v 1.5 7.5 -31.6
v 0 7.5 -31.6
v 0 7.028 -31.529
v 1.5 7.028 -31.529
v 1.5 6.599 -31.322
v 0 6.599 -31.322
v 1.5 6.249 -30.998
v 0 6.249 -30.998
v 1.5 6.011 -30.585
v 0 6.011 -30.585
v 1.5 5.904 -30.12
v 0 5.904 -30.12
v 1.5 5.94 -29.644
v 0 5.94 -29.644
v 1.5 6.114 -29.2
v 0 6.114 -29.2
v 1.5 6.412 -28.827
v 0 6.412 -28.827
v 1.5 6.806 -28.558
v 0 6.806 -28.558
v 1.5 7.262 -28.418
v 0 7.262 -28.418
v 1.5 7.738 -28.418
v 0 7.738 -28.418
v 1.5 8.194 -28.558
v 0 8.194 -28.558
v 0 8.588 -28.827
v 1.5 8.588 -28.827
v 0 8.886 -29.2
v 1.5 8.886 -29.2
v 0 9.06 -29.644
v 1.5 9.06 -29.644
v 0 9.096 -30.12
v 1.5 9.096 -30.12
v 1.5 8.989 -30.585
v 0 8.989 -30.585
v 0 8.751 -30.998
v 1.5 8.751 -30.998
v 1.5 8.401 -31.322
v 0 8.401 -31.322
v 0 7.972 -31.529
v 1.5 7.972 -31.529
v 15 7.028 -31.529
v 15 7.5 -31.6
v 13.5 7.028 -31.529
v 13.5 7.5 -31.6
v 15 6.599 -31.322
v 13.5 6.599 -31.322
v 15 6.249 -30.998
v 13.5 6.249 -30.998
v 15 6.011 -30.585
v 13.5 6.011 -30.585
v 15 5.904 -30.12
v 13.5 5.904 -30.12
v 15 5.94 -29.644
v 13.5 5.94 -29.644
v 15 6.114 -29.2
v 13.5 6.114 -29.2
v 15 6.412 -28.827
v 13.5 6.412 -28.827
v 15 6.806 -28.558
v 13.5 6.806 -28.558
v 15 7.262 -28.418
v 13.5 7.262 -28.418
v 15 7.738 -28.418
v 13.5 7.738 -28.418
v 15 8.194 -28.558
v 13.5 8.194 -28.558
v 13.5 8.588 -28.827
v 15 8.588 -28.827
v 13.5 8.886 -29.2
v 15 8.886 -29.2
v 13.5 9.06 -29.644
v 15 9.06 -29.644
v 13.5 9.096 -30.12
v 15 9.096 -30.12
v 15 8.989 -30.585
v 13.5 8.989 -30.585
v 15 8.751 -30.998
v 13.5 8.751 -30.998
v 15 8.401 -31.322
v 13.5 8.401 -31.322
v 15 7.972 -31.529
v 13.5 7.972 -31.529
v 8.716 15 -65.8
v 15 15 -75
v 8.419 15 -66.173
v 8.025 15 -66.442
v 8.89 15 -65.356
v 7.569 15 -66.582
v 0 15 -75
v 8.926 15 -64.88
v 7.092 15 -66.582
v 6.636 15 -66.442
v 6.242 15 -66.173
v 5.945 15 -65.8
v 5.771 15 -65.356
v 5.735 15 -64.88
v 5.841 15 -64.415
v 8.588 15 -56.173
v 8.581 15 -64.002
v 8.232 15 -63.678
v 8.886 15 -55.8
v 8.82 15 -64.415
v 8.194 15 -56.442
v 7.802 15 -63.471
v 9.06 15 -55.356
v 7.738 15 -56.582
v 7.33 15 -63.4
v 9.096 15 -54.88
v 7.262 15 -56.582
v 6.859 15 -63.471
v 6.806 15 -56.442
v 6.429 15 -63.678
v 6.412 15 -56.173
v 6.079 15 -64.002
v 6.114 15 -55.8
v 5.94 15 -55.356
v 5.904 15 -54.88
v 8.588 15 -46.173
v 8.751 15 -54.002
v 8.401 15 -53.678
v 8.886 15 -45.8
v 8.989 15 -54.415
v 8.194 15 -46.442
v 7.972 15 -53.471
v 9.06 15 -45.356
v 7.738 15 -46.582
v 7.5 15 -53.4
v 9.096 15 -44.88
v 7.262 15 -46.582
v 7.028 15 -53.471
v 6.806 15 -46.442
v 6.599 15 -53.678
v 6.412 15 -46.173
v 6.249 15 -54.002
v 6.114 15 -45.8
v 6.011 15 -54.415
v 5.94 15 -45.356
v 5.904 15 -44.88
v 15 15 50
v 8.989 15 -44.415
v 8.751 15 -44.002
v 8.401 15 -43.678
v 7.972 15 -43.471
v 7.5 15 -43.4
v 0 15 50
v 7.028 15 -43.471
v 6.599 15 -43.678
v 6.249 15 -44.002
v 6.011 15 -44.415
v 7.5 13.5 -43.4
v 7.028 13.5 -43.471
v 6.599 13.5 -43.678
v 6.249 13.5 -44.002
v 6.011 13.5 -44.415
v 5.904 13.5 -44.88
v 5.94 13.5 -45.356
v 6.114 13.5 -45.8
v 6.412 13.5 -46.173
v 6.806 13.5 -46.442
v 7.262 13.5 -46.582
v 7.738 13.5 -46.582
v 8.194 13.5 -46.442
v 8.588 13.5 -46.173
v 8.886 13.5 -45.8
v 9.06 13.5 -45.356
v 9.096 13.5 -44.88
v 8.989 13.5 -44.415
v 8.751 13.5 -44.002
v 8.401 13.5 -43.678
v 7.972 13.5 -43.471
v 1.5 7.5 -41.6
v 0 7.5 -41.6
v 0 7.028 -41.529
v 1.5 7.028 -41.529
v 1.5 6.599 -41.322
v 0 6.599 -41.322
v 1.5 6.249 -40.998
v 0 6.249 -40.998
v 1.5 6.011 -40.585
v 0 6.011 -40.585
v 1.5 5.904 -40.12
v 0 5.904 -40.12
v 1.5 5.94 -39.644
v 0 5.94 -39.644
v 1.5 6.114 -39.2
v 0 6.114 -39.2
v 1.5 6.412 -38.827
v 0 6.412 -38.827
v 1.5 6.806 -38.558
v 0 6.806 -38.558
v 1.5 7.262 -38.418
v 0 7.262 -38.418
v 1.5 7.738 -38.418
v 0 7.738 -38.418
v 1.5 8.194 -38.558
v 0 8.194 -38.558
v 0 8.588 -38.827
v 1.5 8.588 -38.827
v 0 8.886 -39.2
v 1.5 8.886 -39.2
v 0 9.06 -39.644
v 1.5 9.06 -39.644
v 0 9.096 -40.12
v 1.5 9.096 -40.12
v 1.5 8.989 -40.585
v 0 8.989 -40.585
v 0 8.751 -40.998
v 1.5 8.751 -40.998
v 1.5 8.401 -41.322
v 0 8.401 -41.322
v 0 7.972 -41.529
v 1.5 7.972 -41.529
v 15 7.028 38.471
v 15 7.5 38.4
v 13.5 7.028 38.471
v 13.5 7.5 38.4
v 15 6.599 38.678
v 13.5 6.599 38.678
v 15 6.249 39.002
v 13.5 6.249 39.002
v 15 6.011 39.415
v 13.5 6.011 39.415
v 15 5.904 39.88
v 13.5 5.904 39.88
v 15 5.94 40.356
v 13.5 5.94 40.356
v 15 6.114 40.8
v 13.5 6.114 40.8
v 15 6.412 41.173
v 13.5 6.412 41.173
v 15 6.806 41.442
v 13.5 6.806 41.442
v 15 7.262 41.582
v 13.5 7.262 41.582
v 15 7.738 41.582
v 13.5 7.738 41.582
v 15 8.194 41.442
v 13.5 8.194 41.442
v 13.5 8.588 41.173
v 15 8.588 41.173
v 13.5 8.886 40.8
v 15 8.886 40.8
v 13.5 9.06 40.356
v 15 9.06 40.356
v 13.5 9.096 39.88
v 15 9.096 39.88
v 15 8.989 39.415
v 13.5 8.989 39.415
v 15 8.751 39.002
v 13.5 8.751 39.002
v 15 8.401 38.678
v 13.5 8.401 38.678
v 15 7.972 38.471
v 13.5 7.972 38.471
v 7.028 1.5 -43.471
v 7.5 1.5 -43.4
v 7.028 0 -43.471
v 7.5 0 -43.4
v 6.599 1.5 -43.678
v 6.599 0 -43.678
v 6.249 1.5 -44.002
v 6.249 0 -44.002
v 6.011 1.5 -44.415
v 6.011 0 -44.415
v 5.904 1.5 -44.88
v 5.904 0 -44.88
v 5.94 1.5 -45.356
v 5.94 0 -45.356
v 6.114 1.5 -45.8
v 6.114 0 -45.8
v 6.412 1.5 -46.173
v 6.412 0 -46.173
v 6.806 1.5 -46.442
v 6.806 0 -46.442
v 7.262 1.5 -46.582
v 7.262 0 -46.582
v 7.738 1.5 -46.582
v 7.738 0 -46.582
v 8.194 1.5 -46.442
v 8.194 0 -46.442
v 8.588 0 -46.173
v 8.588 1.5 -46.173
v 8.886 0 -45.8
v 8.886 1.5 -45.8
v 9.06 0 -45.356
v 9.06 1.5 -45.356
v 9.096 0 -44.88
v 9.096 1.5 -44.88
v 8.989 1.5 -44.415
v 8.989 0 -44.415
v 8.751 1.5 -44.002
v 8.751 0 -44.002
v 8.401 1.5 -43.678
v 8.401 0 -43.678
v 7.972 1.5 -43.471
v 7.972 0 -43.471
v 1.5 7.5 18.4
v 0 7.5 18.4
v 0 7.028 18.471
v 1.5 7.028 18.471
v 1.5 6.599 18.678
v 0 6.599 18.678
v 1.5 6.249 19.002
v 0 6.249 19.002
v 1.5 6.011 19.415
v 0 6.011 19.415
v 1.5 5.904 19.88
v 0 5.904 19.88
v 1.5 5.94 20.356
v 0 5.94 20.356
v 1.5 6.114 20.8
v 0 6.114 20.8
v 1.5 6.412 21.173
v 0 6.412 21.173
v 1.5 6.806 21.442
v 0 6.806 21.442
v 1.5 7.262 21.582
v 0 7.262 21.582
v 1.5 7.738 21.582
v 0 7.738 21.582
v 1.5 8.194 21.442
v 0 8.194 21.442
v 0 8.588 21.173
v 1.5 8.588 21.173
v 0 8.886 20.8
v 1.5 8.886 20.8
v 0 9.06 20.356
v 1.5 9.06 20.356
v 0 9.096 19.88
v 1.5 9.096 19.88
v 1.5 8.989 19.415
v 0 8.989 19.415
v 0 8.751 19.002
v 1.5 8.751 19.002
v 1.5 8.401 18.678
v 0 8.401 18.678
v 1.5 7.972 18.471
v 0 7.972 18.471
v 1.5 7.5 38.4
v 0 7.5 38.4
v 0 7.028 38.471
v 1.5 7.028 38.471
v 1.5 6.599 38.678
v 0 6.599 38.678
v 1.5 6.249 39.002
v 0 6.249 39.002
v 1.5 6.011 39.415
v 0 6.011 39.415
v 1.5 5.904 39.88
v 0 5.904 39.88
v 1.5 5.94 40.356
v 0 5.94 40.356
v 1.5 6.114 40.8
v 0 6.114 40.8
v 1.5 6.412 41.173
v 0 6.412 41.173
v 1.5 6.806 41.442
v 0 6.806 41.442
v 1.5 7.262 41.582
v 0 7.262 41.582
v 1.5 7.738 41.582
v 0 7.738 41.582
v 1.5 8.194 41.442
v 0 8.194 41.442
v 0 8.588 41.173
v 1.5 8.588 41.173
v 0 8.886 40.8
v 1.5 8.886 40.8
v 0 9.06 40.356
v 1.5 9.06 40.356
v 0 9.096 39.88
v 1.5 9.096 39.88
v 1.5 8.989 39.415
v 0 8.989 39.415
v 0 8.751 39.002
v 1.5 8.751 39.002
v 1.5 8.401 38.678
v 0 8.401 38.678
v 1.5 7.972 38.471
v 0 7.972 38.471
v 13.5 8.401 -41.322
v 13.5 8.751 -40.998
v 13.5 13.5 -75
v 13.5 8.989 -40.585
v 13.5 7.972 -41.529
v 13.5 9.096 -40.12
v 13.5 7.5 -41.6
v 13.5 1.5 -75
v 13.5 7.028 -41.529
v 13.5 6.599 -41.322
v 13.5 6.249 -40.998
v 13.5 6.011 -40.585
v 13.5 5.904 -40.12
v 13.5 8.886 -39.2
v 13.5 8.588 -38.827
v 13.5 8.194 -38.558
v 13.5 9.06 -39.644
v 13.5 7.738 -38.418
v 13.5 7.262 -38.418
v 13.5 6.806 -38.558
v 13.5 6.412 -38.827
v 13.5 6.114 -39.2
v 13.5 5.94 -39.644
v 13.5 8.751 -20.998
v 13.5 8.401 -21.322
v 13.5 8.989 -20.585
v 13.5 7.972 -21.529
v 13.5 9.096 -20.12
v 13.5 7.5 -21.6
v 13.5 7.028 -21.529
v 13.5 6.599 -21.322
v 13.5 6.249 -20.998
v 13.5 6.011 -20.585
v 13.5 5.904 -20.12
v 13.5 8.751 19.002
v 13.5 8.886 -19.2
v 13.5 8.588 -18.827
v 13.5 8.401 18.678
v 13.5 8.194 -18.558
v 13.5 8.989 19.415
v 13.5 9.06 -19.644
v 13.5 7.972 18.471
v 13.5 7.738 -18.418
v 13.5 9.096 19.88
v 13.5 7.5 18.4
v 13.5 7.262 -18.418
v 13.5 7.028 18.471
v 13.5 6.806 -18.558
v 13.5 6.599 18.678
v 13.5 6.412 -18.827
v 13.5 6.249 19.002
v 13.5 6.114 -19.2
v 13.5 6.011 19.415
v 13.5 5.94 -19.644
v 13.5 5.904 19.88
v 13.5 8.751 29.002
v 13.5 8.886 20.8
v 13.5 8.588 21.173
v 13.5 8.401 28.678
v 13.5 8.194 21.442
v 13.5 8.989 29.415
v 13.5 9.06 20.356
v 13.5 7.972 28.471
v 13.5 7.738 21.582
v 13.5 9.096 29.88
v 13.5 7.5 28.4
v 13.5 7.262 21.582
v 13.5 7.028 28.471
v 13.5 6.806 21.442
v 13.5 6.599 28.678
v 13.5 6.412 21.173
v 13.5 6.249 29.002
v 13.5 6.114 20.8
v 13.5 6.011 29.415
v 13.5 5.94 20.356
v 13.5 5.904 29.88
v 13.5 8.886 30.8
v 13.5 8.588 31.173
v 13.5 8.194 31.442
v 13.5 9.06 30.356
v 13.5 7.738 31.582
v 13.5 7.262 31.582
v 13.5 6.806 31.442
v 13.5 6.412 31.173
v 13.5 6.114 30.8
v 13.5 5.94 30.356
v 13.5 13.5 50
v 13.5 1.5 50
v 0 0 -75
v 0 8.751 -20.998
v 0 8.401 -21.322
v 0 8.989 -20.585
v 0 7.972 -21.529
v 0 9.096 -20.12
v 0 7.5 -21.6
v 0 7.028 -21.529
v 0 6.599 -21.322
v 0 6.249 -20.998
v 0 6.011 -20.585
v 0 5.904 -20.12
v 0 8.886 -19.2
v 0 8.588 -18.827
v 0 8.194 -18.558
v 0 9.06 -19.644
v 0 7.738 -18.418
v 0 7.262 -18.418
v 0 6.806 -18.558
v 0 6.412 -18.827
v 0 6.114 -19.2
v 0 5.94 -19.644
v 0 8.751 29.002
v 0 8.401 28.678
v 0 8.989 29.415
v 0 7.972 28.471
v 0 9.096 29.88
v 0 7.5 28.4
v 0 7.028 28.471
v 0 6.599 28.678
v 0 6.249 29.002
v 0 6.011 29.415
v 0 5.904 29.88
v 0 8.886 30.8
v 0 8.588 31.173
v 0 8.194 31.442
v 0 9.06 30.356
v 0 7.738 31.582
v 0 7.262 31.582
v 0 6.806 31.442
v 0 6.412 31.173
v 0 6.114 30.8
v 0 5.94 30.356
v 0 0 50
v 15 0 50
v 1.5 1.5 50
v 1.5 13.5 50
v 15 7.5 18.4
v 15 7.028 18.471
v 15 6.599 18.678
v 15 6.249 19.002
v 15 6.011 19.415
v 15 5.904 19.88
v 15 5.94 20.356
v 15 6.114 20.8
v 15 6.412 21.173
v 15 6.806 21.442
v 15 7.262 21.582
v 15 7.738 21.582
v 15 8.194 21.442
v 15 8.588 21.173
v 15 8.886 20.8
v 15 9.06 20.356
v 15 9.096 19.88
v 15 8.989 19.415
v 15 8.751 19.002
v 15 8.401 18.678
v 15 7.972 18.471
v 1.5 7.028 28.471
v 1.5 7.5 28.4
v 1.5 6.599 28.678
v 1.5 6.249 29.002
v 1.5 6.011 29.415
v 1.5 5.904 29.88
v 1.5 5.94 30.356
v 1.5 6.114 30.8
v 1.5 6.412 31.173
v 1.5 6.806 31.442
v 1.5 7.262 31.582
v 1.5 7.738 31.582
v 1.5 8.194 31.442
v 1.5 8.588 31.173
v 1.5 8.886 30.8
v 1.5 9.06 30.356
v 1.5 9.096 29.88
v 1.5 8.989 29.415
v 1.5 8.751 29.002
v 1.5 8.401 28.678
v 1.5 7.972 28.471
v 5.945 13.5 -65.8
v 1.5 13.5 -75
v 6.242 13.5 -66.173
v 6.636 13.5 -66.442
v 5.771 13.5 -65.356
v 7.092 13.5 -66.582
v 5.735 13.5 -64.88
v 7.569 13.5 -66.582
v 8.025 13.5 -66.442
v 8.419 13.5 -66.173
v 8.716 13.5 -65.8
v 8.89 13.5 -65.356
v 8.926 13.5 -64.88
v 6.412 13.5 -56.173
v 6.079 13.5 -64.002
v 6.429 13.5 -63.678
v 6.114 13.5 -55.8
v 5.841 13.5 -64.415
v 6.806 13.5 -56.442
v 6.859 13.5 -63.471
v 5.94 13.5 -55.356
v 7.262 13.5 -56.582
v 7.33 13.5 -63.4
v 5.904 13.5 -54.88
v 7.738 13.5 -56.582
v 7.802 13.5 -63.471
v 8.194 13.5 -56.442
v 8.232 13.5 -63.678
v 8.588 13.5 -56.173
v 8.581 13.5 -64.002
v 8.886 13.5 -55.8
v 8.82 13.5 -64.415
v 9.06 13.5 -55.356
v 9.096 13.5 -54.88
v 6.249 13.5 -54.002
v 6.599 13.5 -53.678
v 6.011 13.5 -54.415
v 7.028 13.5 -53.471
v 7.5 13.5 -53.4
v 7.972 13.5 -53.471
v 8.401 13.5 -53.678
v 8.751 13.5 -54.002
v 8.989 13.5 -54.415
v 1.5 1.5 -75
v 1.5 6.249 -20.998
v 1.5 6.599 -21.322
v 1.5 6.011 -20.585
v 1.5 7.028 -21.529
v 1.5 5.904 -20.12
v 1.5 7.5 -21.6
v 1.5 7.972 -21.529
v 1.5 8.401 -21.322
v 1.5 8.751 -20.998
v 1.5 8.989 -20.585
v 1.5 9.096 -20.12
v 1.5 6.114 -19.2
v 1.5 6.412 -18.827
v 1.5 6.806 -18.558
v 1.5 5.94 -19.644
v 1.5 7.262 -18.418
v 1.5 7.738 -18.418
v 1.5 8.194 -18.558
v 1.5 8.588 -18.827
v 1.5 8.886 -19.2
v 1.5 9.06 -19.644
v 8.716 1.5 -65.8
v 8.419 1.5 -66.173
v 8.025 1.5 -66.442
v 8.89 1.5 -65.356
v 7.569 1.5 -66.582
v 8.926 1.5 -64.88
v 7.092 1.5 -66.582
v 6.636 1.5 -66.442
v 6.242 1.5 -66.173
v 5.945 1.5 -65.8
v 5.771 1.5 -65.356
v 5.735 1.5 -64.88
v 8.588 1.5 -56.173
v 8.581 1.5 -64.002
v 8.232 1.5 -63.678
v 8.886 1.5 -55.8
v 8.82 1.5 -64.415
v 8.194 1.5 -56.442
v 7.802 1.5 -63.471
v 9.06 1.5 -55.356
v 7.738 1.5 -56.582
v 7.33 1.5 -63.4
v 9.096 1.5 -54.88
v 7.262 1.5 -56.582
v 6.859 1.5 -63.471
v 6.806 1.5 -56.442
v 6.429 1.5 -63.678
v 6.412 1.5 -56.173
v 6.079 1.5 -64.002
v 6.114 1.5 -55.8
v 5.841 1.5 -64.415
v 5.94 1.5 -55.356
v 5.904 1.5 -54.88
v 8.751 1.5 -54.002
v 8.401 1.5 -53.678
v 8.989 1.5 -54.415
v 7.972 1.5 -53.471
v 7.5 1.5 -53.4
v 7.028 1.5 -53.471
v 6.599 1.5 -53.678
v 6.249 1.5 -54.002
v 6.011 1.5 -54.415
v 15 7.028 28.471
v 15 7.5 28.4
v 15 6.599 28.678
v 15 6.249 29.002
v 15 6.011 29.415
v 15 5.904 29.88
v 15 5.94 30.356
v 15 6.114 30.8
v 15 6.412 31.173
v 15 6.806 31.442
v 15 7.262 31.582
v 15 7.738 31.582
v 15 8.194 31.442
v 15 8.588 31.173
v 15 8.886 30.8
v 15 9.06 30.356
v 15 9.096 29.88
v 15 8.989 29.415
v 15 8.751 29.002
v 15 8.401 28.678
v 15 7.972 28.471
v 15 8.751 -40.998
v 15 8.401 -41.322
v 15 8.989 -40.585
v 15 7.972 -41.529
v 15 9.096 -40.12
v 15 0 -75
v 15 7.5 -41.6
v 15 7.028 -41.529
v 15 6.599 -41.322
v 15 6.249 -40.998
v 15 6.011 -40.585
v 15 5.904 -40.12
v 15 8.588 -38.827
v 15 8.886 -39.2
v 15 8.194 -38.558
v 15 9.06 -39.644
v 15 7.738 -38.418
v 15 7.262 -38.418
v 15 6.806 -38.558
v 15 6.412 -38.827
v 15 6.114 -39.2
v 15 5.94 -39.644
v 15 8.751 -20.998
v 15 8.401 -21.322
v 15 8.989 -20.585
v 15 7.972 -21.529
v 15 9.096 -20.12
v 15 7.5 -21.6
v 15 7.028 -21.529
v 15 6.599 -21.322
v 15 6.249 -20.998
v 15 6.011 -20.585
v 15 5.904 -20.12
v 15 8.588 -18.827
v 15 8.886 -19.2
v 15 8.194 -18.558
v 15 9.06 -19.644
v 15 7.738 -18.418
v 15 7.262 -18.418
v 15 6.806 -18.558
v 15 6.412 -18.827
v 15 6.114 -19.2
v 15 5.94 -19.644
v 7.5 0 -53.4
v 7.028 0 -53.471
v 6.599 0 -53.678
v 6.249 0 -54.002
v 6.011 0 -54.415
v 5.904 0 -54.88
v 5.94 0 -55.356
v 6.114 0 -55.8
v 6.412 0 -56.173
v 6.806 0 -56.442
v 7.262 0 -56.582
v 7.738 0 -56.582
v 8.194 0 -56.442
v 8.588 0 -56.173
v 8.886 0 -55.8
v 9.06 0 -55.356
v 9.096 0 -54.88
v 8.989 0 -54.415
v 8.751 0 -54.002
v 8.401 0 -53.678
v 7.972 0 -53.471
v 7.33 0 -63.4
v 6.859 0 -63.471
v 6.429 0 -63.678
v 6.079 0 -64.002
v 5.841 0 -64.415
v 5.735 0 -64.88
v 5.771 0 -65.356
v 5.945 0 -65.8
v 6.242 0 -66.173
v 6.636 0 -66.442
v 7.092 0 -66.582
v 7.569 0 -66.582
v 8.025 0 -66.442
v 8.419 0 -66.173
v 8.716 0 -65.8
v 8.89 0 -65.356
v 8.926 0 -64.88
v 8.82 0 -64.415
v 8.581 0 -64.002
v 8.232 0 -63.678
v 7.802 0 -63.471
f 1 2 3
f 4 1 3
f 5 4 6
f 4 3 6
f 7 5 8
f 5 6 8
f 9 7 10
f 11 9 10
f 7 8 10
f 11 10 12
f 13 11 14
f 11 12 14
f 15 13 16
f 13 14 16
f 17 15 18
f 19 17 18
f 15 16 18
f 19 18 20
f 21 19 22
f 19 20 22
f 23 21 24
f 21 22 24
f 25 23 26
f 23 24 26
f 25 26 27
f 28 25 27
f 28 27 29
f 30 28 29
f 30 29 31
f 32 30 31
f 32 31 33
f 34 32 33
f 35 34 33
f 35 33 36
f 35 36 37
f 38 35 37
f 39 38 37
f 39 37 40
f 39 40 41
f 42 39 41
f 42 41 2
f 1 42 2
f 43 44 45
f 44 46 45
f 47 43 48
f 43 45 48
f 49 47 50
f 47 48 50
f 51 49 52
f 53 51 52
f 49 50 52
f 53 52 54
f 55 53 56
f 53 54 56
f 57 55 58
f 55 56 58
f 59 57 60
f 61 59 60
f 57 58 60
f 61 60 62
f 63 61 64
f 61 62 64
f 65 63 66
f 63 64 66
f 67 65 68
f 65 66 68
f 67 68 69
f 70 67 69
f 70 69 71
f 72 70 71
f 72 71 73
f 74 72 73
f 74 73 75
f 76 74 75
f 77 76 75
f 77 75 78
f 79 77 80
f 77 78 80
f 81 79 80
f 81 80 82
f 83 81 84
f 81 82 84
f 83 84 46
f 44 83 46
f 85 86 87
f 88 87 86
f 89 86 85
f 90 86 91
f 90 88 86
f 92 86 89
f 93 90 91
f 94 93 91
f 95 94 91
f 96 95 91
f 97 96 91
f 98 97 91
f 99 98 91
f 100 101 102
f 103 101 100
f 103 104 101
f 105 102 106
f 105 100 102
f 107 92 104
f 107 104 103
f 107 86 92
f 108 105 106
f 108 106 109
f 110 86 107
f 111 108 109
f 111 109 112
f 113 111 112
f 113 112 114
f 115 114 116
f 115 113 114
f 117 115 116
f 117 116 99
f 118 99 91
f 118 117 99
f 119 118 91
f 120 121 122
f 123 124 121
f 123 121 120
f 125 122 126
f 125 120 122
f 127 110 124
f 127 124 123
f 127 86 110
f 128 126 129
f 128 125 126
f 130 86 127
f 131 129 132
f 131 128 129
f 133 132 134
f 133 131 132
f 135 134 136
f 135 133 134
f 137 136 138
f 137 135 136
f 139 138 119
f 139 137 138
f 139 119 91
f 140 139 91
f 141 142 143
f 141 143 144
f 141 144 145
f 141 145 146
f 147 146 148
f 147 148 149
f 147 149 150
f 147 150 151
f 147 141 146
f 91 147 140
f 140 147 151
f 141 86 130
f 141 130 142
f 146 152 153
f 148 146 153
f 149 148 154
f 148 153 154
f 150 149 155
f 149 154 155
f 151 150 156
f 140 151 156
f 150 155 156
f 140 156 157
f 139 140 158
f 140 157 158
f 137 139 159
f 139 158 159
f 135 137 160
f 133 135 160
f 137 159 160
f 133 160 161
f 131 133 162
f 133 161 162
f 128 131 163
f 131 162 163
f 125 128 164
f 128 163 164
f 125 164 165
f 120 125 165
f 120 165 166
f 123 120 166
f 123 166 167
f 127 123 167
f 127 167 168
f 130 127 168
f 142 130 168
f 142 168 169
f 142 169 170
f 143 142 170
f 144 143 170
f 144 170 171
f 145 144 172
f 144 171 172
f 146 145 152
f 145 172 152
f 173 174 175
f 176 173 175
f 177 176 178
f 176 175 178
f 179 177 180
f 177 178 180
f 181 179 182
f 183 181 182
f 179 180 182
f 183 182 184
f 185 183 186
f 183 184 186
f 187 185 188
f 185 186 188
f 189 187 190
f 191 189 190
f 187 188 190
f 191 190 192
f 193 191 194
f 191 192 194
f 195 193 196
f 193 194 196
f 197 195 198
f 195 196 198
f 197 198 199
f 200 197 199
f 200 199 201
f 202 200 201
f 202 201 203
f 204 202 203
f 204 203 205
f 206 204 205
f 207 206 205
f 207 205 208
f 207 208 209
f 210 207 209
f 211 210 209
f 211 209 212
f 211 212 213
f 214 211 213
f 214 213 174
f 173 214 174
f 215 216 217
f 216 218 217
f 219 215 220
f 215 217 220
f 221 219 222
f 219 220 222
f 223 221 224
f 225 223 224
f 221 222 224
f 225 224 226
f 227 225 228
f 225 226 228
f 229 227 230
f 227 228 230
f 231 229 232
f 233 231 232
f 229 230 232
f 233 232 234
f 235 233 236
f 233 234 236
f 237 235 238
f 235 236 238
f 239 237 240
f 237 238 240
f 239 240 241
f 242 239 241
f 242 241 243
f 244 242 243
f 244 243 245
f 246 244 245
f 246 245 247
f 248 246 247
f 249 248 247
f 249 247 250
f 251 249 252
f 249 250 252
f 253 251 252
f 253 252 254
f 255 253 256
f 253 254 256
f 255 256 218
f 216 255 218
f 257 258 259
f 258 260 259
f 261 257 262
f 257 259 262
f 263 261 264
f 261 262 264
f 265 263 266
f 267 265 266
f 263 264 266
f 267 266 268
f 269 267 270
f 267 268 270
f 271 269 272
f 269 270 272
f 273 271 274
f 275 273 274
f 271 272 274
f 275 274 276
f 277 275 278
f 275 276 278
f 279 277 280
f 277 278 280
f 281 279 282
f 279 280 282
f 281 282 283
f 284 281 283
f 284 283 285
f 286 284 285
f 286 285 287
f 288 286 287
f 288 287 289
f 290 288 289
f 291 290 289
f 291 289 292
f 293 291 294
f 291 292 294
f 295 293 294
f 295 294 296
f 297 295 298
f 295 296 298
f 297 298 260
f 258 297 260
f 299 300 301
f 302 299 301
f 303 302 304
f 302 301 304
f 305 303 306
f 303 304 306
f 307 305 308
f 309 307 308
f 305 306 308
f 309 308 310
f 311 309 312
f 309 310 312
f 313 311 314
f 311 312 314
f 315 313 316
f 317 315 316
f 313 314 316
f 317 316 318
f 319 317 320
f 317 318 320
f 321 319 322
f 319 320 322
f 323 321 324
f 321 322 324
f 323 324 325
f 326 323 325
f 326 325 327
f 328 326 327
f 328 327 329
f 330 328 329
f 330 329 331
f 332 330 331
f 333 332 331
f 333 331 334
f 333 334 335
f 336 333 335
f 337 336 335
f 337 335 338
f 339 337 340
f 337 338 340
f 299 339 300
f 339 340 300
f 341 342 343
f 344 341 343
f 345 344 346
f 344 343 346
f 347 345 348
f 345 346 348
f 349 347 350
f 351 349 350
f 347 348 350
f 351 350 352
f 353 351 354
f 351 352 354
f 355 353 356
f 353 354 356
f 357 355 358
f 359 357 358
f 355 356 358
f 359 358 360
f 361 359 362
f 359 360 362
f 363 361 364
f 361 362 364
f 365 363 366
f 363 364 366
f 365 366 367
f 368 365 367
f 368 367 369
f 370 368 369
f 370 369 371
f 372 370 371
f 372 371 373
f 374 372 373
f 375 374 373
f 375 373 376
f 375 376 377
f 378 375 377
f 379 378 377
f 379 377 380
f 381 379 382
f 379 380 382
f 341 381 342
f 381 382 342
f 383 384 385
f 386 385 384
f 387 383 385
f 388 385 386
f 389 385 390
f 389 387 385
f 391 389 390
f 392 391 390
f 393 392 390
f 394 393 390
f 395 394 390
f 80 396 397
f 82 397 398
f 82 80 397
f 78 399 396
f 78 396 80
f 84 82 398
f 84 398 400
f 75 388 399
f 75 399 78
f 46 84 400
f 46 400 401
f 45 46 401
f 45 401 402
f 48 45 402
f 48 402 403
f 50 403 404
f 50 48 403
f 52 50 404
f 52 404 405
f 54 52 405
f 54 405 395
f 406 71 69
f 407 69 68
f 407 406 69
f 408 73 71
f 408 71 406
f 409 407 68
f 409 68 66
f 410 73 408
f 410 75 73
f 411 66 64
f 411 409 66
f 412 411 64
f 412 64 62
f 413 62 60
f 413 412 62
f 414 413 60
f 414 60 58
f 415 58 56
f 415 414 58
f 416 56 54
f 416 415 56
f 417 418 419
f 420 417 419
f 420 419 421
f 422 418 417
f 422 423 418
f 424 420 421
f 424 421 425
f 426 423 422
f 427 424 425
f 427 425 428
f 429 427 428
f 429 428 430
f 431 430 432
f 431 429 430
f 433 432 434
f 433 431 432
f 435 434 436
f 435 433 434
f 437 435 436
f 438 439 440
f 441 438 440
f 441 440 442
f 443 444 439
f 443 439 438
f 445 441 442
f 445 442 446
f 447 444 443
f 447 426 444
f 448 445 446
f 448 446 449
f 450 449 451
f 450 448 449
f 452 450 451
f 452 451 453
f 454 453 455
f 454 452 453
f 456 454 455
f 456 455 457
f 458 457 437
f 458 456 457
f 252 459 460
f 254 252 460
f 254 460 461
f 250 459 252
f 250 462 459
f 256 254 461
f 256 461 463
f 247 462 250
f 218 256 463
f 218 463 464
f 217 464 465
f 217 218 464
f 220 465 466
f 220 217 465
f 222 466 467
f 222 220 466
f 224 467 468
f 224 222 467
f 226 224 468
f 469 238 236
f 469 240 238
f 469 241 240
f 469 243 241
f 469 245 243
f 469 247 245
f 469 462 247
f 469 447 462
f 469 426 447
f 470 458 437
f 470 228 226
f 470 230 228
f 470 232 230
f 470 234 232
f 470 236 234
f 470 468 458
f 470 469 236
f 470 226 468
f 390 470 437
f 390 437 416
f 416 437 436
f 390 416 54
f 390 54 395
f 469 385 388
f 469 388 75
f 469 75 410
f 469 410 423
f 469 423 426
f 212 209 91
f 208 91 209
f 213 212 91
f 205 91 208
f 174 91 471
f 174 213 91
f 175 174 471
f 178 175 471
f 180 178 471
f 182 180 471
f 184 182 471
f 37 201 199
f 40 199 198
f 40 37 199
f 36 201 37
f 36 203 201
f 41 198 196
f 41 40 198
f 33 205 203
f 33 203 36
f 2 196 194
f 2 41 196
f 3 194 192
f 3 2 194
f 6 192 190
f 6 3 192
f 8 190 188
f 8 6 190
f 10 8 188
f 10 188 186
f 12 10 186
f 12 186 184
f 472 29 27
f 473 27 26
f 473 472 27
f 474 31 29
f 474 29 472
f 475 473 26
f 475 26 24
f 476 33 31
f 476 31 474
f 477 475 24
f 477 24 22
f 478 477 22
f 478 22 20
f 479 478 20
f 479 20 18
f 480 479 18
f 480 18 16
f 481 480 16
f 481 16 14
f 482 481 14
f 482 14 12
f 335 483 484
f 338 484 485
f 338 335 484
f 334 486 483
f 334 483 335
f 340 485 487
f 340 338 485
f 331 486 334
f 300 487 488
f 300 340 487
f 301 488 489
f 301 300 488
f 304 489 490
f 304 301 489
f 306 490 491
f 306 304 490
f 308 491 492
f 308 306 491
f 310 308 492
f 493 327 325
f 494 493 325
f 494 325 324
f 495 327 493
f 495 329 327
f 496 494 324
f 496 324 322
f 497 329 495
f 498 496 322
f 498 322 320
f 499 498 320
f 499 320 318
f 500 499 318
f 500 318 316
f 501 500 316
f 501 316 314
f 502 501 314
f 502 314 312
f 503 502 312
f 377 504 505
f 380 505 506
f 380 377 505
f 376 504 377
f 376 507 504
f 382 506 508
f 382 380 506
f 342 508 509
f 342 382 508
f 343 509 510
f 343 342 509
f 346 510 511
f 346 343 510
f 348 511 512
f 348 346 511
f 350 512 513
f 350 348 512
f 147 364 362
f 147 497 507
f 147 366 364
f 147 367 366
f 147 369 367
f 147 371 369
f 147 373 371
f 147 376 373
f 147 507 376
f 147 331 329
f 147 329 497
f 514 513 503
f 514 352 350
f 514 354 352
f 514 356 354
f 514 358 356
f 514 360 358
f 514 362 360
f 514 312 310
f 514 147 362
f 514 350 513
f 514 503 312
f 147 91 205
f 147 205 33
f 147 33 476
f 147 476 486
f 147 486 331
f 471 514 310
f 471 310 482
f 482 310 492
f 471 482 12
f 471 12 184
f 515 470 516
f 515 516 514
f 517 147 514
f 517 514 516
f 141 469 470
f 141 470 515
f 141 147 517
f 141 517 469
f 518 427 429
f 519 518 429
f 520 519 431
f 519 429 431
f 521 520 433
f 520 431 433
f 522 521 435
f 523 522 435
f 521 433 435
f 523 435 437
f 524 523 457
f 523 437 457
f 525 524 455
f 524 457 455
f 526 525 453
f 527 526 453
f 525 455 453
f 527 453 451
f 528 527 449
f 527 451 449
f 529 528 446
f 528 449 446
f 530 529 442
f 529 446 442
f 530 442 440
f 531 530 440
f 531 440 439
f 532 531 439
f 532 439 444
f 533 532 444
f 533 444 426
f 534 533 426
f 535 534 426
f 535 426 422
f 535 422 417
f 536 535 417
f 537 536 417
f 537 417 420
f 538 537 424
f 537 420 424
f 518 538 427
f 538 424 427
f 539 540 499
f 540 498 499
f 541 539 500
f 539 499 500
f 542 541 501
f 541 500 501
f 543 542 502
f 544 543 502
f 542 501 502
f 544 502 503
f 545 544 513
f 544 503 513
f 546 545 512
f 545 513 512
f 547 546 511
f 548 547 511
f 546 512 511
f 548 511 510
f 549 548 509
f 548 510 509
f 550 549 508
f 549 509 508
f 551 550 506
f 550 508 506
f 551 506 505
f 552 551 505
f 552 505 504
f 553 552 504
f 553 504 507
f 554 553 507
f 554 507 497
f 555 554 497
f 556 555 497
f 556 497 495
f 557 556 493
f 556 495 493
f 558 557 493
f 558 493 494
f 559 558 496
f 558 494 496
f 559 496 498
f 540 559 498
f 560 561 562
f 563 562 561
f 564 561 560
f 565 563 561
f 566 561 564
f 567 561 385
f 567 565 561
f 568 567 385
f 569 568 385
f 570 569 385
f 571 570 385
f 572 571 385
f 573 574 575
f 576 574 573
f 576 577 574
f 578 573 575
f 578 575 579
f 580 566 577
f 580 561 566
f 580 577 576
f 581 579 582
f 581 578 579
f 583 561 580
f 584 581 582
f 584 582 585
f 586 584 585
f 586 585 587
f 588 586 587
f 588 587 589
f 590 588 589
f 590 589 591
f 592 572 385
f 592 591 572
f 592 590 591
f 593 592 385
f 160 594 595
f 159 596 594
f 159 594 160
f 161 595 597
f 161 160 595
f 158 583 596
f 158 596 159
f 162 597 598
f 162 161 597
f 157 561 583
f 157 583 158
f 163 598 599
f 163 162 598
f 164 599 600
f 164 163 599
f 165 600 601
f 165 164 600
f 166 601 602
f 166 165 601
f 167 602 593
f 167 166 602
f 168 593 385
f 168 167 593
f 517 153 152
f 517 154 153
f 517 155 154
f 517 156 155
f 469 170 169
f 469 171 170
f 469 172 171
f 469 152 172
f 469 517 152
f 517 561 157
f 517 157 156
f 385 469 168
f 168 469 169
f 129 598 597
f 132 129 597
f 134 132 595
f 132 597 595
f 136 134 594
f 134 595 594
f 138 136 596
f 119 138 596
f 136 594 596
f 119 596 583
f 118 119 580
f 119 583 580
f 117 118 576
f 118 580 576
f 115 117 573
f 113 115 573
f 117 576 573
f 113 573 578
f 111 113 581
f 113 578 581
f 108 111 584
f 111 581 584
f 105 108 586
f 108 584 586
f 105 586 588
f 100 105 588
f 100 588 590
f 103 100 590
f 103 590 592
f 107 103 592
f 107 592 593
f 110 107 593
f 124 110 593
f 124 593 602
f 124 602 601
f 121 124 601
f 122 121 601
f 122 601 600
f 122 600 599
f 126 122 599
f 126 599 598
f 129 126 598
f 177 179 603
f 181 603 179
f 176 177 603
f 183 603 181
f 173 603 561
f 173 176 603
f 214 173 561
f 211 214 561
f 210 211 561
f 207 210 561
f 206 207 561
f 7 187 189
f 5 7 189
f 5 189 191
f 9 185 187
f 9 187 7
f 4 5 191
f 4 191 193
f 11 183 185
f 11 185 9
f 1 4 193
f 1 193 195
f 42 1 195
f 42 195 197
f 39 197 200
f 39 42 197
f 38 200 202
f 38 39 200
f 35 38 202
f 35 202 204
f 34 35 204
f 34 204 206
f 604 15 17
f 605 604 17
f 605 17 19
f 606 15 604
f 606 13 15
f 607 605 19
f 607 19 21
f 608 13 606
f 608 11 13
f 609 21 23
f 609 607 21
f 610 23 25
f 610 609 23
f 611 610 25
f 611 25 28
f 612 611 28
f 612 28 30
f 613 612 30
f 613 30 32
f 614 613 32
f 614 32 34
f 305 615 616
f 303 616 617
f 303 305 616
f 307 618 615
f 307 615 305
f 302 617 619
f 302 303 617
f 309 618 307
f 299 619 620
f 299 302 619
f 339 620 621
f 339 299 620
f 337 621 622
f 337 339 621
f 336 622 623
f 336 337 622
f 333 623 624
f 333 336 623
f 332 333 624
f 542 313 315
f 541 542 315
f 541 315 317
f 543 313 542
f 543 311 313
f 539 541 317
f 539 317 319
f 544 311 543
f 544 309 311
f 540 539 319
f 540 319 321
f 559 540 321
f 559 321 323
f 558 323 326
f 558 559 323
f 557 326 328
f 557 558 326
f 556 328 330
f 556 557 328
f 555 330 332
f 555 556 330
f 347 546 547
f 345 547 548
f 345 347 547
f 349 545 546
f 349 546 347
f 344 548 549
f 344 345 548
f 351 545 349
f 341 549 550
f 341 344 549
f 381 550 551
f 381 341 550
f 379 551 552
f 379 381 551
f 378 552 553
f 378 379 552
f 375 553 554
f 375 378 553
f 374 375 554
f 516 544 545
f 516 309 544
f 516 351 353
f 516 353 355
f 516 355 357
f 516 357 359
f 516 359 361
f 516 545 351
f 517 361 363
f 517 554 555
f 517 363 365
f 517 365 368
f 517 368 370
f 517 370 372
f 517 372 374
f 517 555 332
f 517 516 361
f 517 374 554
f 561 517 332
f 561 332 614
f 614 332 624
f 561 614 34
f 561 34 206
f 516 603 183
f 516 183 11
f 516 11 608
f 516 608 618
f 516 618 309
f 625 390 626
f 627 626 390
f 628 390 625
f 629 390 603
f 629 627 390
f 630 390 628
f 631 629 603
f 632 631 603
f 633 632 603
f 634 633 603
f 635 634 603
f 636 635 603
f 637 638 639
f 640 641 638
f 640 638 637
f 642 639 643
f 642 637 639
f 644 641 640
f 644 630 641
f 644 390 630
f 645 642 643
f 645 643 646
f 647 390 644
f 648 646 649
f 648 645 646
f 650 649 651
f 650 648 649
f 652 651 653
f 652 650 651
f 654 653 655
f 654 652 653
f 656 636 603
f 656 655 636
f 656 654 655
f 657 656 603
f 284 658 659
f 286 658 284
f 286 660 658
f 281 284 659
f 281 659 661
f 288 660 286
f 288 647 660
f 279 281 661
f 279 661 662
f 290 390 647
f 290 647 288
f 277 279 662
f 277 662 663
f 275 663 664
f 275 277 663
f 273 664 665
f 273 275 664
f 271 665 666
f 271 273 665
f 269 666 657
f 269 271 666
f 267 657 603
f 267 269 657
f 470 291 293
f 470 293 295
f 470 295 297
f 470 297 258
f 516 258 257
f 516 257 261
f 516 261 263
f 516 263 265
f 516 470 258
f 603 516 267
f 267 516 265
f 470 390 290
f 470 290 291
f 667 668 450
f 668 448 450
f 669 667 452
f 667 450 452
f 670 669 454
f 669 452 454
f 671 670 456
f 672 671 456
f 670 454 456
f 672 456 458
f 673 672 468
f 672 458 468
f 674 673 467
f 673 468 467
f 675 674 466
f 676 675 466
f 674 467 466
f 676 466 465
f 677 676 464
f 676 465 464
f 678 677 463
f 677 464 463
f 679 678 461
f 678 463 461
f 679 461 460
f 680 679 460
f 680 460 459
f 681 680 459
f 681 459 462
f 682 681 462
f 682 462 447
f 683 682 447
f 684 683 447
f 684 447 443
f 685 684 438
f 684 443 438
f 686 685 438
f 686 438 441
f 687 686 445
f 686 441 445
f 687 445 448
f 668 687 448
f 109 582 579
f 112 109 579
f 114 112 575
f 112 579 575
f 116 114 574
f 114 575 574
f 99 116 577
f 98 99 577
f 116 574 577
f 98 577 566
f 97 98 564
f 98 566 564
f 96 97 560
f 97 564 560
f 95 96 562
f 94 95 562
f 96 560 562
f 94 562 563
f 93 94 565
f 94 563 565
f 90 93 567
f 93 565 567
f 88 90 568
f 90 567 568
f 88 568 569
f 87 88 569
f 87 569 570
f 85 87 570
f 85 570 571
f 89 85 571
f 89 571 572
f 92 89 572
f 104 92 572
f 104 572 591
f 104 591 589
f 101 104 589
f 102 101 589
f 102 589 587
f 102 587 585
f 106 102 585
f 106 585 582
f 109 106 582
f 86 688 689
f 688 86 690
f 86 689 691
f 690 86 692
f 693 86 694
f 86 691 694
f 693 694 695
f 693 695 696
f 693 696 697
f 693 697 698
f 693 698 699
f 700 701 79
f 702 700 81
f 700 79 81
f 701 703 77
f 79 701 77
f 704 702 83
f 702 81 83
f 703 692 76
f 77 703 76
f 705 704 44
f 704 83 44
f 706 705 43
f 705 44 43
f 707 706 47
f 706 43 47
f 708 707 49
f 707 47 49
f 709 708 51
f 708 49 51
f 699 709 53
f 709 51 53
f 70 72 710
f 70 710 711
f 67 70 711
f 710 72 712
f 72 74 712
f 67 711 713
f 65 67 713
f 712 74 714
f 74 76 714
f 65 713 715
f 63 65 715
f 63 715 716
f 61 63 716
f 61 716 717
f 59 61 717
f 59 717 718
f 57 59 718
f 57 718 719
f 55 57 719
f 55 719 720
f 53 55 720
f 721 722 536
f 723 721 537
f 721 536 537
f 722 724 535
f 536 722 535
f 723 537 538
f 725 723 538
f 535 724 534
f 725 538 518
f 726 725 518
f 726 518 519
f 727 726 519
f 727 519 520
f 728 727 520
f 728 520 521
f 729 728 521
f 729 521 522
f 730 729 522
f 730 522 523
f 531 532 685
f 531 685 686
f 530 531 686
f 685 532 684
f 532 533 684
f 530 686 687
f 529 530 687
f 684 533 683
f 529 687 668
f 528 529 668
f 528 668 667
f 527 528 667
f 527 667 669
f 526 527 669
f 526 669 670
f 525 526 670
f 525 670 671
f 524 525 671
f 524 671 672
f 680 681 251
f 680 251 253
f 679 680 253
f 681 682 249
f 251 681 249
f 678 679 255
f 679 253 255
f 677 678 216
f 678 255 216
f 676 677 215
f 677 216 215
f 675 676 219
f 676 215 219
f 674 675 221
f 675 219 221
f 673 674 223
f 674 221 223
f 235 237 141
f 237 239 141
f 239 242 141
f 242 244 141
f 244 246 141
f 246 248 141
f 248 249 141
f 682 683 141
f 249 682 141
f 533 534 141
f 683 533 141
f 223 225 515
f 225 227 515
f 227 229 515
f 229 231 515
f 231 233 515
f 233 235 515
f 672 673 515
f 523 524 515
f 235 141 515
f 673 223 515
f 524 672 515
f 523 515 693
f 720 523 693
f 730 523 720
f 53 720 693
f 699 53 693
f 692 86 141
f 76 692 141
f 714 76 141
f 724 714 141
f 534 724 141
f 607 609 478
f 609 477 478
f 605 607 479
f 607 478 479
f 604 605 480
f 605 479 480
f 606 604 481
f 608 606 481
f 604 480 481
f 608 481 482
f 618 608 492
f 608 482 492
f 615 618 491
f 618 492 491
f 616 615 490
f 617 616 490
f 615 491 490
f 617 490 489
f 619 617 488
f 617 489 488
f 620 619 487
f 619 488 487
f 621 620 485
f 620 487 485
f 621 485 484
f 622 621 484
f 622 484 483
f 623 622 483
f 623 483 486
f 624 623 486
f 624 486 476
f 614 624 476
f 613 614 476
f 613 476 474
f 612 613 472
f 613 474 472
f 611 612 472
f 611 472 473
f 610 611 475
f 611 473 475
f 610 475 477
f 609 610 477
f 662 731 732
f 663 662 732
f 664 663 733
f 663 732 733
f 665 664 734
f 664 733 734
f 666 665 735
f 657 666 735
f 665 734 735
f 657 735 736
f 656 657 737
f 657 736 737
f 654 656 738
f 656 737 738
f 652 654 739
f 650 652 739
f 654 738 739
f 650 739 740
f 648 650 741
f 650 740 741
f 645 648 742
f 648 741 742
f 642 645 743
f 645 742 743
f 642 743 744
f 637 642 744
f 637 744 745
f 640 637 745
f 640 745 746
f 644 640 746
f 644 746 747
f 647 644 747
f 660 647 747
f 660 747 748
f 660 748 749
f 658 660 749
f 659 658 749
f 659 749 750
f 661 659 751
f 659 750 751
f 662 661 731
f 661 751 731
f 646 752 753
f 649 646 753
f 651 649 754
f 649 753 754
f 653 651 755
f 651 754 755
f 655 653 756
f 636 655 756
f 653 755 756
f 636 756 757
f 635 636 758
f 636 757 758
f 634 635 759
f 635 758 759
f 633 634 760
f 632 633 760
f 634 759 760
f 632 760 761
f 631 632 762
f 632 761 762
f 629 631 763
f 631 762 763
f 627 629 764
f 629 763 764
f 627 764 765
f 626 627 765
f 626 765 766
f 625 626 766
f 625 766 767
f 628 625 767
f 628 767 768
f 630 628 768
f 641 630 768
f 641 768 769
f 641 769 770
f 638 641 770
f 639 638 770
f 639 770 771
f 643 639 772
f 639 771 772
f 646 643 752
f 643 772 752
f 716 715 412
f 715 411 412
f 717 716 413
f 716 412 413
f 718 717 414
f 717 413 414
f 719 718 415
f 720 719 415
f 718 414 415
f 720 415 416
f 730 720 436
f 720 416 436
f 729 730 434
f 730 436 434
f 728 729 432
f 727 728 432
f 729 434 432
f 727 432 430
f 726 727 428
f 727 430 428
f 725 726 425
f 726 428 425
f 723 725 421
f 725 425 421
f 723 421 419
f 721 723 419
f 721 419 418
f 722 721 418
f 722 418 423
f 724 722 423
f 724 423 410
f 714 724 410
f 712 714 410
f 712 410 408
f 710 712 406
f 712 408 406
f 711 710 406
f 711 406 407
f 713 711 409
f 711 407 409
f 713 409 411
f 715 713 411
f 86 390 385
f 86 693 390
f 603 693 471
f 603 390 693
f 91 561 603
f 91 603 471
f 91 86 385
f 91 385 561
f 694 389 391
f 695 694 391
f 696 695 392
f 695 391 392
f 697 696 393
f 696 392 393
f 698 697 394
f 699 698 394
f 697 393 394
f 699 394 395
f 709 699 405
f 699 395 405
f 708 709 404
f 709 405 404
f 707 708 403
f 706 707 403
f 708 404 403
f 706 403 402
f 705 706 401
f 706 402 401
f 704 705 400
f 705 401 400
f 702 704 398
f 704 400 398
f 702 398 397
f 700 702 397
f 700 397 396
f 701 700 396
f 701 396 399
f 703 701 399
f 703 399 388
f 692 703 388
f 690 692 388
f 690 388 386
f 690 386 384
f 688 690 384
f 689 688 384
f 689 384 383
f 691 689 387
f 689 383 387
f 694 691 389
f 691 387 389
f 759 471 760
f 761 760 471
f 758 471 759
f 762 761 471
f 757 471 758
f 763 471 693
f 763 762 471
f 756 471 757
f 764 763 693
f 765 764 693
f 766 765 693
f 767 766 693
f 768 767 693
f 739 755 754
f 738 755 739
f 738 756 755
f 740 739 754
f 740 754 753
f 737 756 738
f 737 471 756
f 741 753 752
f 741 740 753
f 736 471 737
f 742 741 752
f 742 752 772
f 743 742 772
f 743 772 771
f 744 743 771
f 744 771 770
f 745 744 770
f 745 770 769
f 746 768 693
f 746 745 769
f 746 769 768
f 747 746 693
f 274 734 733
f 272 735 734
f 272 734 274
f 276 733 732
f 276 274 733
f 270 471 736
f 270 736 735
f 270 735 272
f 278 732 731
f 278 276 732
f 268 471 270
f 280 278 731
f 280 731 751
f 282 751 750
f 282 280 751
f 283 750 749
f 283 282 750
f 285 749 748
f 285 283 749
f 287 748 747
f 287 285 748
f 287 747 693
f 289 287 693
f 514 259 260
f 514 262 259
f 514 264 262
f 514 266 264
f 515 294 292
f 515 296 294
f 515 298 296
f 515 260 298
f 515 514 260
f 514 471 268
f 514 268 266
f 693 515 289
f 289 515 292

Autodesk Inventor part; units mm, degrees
ref_plane "YZ Plane" through (0, 0, 0) normal (1, 0, 0) x (0, 1, 0)
ref_plane "XZ Plane" through (0, 0, 0) normal (0, 1, 0) x (-1, 0, 0)
ref_plane "XY Plane" through (0, 0, 0) normal (0, 0, 1) x (1, 0, 0)
sketch "スケッチ1" plane through (0, 0, 0) normal (0, 0, 1) x (1, 0, 0)
  line L0 (0, 0) -> (15, 0)
  line L1 (15, 0) -> (15, 15)
  line L2 (15, 15) -> (0, 15)
  line L3 (0, 15) -> (0, 0)
  dimension "d0" = 15
  dimension "d1" = 15
extrude "押し出し1" add sketch "スケッチ1" along normal blind 50
sketch "スケッチ3" plane through (0, 0, 0) normal (0, 0, -1) x (-1, 0, 0)
  line L0 (0, 15) -> (0, 0) projected
  line L1 (0, 0) -> (-15, 0)
  line L2 (-15, 0) -> (-15, 15)
  line L3 (-15, 15) -> (0, 15)
  line L4 (0, 15) -> (0, 0)
  dimension "d21" = 15
  dimension "d22" = 15
extrude "押し出し2" add sketch "スケッチ3" along normal blind 135
sketch "スケッチ4" plane through (0, 15, 50) normal (0, 1, 0) x (1, 0, 0)
  line L0 (15, 0) -> (15, 185) projected
  line L1 (15, 185) -> (0, 185)
  line L2 (0, 185) -> (0, 105)
  line L3 (0, 105) -> (15, 105)
  line L4 (15, 105) -> (15, 185)
  point P0 (0, 50)
  dimension "d25" = 15
  dimension "d26" = 80
extrude "押し出し3" cut sketch "スケッチ4" against normal blind 135
sketch "スケッチ5" plane through (15, 15, -55) normal (0, 0, -1) x (-1, 0, 0)
  line L0 (15, 0) -> (15, -15) projected
  line L1 (0, -15) -> (0, 0) projected
  line L2 (15, -15) -> (0, -15)
  line L3 (0, -15) -> (0, 0)
  line L4 (0, 0) -> (15, 0)
  line L5 (15, 0) -> (15, -15)
extrude "押し出し4" add sketch "スケッチ5" along normal blind 15
sketch "スケッチ8" plane through (15, 0, 50) normal (1, 0, 0) x (0, 0, -1)
  line L0 (120, 15) -> (120, 0) projected
  line L1 (120, 15) -> (0, 15) projected
  point P0 (50, 0)
  point P1 (90, 7.5)
  point P2 (80, 7.5)
  point P3 (70, 7.5)
  dimension "d54" = 30
  dimension "d55" = 7.5
  dimension "d56" = 7.5
  dimension "d57" = 7.5
  dimension "d58" = 10
  dimension "d59" = 10
hole "穴4" at (15, 7.5, -40) at (15, 7.5, -30) at (15, 7.5, -20) direction (-1, 0, 0) diameter 3.2 end through all
sketch "スケッチ9" plane through (15, 0, 50) normal (1, 0, 0) x (0, 0, -1)
  line L0 (0, 0) -> (0, 15) projected
  line L1 (0, 0) -> (120, 0) projected
  point P0 (50, 0)
  point P1 (10, 7.5)
  point P2 (20, 7.5)
  dimension "d67" = 10
  dimension "d68" = 10
  dimension "d69" = 7.5
  dimension "d70" = 7.5
hole "穴5" at (15, 7.5, 40) at (15, 7.5, 30) direction (-1, 0, 0) diameter 3.2 end through all
sketch "スケッチ10" plane through (15, 0, 50) normal (1, 0, 0) x (0, 0, -1)
  point P0 (50, 0)
sketch "スケッチ11" plane through (15, 0, 50) normal (1, 0, 0) x (0, 0, -1)
  line L0 (0, 0) -> (0, 15) projected
  line L1 (0, 0) -> (120, 0) projected
  point P0 (50, 0)
  point P1 (30, 7.5)
  dimension "d78" = 30
  dimension "d79" = 7.5
hole "穴6" at (15, 7.5, 20) direction (-1, 0, 0) diameter 3.2 end through all
sketch "スケッチ12" plane through (15, 15, -70) normal (0, 0, -1) x (-1, 0, 0)
  line L0 (0, 0) -> (0, -15) projected
  line L1 (0, 0) -> (15, 0)
  line L2 (15, 0) -> (15, -15)
  line L3 (15, -15) -> (0, -15)
  line L4 (0, -15) -> (0, 0)
extrude "押し出し5" add sketch "スケッチ12" along normal blind 5
sketch "スケッチ13" plane through (0, 15, 50) normal (0, 1, 0) x (1, 0, 0)
  line L0 (0, 125) -> (15, 125) projected
  point P0 (0, 50)
  point P1 (7.3304, 115)
  point P2 (7.5, 105)
  point P3 (7.5, 95)
  dimension "d89" = 10
  dimension "d90" = 10
  dimension "d91" = 10
hole "穴7" at (7.5, 15, -45) at (7.5, 15, -55) at (7.3304, 15, -65) direction (0, -1, 0) diameter 3.2 end through all
sketch "スケッチ14" plane through (0, 0, 50) normal (0, 0, 1) x (1, 0, 0)
  line L0 (1.5, 13.5) -> (13.5, 13.5)
  line L1 (13.5, 13.5) -> (13.5, 1.5)
  line L2 (13.5, 1.5) -> (1.5, 1.5)
  line L3 (1.5, 1.5) -> (1.5, 13.5)
  line L4 (15, 15) -> (0, 15) projected
  line L5 (0, 15) -> (0, 0) projected
  dimension "d99" = 12
  dimension "d100" = 12
  dimension "d101" = 1.5
  dimension "d102" = 1.5
extrude "押し出し6" cut sketch "スケッチ14" against normal blind 500
properties part number "射出_角柱10" material "アルミニウム 6061"
